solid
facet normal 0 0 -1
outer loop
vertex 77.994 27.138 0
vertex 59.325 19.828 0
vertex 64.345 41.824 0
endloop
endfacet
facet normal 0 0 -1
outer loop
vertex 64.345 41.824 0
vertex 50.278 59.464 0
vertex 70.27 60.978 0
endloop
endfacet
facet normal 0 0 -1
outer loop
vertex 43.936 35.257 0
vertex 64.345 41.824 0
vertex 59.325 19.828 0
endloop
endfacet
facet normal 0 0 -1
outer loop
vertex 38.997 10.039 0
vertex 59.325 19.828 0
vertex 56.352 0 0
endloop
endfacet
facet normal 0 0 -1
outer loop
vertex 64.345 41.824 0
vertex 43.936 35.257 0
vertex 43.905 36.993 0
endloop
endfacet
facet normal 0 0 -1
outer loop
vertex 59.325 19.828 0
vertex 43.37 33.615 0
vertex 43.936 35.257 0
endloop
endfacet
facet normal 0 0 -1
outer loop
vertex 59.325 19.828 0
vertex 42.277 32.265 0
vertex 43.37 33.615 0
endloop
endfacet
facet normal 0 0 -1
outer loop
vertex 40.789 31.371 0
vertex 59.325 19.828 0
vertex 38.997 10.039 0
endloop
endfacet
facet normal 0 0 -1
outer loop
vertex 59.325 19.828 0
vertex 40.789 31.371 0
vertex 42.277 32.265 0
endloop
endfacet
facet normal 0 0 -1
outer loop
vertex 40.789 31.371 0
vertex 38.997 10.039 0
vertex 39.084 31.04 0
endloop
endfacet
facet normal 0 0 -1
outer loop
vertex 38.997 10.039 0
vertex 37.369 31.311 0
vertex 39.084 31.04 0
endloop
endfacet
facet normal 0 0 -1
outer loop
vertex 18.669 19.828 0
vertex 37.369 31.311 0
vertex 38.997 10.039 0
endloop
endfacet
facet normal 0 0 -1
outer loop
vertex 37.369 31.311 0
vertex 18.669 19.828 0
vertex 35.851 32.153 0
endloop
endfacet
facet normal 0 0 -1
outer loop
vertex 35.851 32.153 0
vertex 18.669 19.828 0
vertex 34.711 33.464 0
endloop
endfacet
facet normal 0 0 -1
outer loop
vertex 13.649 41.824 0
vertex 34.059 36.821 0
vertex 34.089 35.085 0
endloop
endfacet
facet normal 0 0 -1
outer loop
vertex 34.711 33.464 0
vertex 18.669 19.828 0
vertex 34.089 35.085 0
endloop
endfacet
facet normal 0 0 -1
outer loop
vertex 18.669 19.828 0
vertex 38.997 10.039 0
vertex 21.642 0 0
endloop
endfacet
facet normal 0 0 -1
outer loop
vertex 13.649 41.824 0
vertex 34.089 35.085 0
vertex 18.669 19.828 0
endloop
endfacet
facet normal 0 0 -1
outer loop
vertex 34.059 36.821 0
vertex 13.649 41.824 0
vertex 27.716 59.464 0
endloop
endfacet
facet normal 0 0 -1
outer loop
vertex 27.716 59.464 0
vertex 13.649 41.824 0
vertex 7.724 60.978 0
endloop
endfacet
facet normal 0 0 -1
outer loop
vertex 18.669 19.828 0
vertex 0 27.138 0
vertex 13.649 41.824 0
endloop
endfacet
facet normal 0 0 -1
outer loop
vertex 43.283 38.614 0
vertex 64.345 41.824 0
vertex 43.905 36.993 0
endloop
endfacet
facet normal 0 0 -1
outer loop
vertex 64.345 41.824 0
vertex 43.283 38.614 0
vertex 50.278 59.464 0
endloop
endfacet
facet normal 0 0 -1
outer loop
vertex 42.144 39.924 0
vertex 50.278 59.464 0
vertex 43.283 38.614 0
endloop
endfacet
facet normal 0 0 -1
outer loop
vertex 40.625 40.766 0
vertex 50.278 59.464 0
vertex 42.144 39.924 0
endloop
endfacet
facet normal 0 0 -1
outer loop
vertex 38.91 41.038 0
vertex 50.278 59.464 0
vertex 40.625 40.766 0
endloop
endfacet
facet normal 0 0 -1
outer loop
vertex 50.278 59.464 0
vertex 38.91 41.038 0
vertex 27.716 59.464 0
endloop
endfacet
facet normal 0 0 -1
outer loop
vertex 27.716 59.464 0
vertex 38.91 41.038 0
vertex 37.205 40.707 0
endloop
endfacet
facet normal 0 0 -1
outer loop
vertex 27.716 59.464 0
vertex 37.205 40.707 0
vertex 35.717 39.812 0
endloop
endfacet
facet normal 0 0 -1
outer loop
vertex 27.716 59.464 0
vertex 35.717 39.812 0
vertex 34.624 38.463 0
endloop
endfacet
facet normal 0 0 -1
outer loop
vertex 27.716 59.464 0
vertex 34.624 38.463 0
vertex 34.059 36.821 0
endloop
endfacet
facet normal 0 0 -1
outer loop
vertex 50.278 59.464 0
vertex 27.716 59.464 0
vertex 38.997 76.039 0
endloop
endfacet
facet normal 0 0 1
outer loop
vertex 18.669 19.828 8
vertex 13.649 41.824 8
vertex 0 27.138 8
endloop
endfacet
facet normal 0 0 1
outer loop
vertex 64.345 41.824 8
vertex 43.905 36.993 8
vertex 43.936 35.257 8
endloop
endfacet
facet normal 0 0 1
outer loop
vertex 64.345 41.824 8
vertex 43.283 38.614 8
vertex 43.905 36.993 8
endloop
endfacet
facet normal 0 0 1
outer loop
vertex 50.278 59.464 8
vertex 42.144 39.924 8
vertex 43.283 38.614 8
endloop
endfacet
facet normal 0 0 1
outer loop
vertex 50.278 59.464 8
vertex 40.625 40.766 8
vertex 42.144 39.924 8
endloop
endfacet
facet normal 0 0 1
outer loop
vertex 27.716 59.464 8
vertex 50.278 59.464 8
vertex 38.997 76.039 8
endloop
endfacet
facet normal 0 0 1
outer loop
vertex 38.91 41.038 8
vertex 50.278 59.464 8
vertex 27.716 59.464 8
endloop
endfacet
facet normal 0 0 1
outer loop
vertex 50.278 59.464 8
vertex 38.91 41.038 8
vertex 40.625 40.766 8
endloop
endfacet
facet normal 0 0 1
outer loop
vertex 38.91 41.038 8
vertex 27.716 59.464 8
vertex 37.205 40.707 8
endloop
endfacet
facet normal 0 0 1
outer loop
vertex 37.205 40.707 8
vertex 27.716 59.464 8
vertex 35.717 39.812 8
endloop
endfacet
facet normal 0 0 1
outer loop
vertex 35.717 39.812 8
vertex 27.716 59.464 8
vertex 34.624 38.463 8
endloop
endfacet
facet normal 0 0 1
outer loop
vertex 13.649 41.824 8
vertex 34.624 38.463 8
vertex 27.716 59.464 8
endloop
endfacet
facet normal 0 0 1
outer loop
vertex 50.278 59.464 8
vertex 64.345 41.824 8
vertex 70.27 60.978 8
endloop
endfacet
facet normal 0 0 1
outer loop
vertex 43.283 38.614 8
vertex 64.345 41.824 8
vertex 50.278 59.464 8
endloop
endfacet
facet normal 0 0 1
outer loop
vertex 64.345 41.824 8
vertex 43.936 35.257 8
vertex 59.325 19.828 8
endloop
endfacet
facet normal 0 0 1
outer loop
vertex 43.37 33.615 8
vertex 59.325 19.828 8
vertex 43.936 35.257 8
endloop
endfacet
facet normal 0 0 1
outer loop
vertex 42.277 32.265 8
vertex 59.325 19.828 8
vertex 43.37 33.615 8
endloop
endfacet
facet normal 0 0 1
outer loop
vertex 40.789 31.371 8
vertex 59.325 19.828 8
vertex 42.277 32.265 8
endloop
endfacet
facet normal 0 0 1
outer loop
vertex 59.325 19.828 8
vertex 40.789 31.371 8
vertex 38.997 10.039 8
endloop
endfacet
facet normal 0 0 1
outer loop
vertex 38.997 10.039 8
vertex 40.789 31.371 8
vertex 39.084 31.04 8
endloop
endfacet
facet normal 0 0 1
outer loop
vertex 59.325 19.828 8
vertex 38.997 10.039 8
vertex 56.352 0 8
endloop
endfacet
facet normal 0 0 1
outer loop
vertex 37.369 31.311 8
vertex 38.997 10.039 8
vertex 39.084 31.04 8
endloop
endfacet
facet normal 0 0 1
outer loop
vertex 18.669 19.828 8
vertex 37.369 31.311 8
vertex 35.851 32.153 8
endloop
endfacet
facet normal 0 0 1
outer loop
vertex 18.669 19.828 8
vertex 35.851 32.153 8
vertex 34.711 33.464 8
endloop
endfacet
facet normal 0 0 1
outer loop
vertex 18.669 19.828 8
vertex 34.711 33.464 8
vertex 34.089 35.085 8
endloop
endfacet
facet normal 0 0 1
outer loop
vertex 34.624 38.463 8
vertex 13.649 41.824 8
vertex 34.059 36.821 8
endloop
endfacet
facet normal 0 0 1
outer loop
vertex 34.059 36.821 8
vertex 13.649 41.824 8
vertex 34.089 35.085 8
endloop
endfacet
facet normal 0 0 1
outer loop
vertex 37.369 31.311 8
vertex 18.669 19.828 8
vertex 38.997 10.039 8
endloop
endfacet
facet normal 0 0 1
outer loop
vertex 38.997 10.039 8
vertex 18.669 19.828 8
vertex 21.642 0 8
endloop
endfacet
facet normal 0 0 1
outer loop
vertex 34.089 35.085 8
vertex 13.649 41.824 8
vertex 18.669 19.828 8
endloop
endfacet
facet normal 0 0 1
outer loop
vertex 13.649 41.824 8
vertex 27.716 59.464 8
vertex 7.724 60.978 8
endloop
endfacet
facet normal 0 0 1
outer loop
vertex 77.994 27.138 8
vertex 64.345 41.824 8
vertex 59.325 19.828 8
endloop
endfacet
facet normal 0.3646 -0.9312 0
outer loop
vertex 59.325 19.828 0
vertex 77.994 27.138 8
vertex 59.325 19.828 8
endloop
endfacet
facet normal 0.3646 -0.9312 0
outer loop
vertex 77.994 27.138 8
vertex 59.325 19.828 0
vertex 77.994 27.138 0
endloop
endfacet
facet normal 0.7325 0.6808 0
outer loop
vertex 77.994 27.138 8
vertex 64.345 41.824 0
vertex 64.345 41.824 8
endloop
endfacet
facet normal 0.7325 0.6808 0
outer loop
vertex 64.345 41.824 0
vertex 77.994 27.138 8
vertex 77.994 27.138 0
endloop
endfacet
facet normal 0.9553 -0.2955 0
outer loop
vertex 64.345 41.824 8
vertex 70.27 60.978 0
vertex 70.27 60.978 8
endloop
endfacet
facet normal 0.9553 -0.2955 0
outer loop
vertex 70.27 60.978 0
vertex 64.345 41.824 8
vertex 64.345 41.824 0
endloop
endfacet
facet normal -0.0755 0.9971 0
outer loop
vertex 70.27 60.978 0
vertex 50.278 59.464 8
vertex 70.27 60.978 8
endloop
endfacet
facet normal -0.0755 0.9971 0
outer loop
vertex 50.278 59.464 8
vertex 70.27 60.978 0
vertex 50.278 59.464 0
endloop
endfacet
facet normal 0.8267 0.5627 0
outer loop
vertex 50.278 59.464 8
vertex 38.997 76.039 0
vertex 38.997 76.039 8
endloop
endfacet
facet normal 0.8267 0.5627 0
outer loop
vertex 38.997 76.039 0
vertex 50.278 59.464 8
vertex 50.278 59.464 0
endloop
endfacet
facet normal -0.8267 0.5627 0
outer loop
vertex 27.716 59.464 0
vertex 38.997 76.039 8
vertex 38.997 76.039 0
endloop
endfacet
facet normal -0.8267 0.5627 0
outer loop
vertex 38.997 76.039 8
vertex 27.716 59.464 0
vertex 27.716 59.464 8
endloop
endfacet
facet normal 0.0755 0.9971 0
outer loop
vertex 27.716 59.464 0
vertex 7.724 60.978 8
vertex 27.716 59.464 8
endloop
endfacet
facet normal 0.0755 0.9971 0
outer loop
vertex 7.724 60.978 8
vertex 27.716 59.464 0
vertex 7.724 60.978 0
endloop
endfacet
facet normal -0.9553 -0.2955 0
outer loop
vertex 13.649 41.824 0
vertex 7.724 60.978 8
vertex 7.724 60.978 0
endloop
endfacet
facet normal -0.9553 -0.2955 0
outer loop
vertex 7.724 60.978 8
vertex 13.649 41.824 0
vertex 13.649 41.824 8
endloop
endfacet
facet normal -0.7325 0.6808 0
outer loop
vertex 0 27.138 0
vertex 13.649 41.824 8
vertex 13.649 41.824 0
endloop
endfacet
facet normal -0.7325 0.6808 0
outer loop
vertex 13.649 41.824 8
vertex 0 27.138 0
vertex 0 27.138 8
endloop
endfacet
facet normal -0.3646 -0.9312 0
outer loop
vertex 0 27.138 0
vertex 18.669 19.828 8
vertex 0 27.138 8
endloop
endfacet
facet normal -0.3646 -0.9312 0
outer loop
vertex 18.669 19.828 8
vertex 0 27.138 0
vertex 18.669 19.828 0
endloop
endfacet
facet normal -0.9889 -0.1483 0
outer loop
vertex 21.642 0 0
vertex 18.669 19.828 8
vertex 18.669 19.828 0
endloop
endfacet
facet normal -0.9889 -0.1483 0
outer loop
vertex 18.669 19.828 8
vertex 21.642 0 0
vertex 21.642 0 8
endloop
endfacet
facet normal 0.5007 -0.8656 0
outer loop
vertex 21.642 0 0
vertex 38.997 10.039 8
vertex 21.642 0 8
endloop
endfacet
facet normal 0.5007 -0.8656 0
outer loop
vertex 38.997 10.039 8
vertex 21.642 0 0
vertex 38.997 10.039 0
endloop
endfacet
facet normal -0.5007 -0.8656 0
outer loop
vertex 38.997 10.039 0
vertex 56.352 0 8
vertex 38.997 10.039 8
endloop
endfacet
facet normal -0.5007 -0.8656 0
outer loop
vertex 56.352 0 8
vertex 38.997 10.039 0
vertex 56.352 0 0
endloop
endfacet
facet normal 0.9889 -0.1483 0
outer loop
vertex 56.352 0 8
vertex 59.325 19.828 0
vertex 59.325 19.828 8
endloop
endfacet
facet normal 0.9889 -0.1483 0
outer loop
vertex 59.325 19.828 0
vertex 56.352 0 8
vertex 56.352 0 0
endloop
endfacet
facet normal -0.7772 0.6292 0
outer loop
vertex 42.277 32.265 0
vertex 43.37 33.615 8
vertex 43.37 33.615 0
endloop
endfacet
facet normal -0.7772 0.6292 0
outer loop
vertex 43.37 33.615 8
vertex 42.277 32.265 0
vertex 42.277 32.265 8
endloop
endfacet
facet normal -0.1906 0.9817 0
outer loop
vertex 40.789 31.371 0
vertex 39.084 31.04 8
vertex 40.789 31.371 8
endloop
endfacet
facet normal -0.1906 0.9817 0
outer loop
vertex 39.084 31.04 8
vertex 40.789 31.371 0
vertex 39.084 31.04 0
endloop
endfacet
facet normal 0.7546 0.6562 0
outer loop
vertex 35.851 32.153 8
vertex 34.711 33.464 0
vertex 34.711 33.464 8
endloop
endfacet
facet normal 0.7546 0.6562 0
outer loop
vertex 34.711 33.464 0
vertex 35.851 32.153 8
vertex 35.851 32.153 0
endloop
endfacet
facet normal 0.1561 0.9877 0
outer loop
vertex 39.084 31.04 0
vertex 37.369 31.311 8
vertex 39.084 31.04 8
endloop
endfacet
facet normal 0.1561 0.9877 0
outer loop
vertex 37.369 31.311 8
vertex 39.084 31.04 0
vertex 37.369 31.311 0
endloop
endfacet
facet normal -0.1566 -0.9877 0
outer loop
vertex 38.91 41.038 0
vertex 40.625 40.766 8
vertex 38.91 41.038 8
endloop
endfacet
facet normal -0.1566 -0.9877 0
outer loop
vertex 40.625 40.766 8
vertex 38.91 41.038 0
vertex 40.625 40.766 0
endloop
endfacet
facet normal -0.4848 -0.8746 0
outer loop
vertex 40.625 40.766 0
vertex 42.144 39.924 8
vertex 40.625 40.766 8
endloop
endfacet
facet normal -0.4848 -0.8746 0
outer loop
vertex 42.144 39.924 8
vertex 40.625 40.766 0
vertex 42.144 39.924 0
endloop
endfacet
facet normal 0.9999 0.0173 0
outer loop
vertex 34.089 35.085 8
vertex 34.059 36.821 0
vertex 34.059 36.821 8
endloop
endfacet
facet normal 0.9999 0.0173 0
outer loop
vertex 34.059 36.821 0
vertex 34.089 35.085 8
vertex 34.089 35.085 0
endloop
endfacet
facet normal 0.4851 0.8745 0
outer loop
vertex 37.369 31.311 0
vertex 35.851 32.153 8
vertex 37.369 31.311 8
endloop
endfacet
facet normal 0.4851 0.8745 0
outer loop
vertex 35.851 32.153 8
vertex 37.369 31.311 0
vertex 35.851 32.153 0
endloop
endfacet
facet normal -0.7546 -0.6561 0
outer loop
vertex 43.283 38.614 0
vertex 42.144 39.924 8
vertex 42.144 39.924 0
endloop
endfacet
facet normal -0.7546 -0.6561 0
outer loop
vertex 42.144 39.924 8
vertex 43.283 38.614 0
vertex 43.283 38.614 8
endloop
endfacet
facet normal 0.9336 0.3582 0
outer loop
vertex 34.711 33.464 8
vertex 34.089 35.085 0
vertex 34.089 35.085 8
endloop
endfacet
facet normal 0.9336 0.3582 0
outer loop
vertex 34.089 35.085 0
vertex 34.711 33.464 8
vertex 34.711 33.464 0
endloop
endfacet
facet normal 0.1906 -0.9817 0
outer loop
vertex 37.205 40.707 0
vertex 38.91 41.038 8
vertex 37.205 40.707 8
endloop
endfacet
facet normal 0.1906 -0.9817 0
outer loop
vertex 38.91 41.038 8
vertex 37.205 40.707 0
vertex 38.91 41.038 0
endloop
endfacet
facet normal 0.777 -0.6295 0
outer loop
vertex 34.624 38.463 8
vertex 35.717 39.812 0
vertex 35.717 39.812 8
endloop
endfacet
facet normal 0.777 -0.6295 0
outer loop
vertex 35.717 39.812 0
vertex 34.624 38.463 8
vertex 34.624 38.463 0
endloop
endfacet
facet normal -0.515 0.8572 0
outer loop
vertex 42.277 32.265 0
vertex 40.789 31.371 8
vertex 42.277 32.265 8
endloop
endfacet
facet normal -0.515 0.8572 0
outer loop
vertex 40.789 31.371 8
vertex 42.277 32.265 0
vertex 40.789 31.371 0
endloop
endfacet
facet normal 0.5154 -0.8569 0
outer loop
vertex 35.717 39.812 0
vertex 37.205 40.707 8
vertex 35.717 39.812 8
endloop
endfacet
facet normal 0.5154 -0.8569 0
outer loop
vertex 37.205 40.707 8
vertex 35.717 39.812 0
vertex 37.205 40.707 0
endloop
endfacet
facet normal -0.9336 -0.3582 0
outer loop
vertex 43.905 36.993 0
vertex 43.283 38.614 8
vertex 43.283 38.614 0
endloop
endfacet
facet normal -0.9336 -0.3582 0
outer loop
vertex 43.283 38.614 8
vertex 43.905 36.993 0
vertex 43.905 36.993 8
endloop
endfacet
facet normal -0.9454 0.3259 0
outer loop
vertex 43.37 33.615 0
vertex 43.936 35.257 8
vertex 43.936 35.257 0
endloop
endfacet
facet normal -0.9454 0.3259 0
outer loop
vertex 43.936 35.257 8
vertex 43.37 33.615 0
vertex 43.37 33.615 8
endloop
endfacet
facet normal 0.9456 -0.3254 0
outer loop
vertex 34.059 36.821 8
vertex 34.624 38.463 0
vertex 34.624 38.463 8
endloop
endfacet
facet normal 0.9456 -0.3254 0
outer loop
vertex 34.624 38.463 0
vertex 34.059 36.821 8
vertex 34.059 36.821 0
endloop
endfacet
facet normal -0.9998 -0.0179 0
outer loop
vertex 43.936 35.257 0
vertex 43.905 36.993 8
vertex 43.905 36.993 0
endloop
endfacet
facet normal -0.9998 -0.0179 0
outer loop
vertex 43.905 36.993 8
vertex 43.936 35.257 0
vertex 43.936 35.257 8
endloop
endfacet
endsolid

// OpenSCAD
$fn = 32;

// ----------------------------------------------------------------------
// Star wheel: 7-point blunt, R40
// ----------------------------------------------------------------------

// --- parameters (mm) ---
n_points = 7;             // number of points / teeth
r_out = 40;               // tip radius
r_in = 26;                // root radius
bore_r = 5;               // centre bore radius
plate_t = 8;              // plate thickness, Z (extrusion height)
bore_d = 10;              // centre bore diameter

profile = [[38.997, 76.039], [27.716, 59.464], [7.724, 60.978], [13.649, 41.824], [0, 27.138], [18.669, 19.828], [21.642, 0], [38.997, 10.039], [56.352, 0], [59.325, 19.828], [77.994, 27.138], [64.345, 41.824], [70.27, 60.978], [50.278, 59.464]];  // primary outline, 14 points, counter clockwise
void_1 = [[43.905, 36.993], [43.283, 38.614], [42.144, 39.924], [40.625, 40.766], [38.91, 41.038], [37.205, 40.707], [35.717, 39.812], [34.624, 38.463], [34.059, 36.821], [34.089, 35.085], [34.711, 33.464], [35.851, 32.153], [37.369, 31.311], [39.084, 31.04], [40.789, 31.371], [42.277, 32.265], [43.37, 33.615], [43.936, 35.257]];  // centre bore, 18 points

// --- the one profile operation ---
difference() {
  linear_extrude(height = plate_t) polygon(points = profile);
  translate([0, 0, -1])
    linear_extrude(height = plate_t + 2) polygon(points = void_1);
}
